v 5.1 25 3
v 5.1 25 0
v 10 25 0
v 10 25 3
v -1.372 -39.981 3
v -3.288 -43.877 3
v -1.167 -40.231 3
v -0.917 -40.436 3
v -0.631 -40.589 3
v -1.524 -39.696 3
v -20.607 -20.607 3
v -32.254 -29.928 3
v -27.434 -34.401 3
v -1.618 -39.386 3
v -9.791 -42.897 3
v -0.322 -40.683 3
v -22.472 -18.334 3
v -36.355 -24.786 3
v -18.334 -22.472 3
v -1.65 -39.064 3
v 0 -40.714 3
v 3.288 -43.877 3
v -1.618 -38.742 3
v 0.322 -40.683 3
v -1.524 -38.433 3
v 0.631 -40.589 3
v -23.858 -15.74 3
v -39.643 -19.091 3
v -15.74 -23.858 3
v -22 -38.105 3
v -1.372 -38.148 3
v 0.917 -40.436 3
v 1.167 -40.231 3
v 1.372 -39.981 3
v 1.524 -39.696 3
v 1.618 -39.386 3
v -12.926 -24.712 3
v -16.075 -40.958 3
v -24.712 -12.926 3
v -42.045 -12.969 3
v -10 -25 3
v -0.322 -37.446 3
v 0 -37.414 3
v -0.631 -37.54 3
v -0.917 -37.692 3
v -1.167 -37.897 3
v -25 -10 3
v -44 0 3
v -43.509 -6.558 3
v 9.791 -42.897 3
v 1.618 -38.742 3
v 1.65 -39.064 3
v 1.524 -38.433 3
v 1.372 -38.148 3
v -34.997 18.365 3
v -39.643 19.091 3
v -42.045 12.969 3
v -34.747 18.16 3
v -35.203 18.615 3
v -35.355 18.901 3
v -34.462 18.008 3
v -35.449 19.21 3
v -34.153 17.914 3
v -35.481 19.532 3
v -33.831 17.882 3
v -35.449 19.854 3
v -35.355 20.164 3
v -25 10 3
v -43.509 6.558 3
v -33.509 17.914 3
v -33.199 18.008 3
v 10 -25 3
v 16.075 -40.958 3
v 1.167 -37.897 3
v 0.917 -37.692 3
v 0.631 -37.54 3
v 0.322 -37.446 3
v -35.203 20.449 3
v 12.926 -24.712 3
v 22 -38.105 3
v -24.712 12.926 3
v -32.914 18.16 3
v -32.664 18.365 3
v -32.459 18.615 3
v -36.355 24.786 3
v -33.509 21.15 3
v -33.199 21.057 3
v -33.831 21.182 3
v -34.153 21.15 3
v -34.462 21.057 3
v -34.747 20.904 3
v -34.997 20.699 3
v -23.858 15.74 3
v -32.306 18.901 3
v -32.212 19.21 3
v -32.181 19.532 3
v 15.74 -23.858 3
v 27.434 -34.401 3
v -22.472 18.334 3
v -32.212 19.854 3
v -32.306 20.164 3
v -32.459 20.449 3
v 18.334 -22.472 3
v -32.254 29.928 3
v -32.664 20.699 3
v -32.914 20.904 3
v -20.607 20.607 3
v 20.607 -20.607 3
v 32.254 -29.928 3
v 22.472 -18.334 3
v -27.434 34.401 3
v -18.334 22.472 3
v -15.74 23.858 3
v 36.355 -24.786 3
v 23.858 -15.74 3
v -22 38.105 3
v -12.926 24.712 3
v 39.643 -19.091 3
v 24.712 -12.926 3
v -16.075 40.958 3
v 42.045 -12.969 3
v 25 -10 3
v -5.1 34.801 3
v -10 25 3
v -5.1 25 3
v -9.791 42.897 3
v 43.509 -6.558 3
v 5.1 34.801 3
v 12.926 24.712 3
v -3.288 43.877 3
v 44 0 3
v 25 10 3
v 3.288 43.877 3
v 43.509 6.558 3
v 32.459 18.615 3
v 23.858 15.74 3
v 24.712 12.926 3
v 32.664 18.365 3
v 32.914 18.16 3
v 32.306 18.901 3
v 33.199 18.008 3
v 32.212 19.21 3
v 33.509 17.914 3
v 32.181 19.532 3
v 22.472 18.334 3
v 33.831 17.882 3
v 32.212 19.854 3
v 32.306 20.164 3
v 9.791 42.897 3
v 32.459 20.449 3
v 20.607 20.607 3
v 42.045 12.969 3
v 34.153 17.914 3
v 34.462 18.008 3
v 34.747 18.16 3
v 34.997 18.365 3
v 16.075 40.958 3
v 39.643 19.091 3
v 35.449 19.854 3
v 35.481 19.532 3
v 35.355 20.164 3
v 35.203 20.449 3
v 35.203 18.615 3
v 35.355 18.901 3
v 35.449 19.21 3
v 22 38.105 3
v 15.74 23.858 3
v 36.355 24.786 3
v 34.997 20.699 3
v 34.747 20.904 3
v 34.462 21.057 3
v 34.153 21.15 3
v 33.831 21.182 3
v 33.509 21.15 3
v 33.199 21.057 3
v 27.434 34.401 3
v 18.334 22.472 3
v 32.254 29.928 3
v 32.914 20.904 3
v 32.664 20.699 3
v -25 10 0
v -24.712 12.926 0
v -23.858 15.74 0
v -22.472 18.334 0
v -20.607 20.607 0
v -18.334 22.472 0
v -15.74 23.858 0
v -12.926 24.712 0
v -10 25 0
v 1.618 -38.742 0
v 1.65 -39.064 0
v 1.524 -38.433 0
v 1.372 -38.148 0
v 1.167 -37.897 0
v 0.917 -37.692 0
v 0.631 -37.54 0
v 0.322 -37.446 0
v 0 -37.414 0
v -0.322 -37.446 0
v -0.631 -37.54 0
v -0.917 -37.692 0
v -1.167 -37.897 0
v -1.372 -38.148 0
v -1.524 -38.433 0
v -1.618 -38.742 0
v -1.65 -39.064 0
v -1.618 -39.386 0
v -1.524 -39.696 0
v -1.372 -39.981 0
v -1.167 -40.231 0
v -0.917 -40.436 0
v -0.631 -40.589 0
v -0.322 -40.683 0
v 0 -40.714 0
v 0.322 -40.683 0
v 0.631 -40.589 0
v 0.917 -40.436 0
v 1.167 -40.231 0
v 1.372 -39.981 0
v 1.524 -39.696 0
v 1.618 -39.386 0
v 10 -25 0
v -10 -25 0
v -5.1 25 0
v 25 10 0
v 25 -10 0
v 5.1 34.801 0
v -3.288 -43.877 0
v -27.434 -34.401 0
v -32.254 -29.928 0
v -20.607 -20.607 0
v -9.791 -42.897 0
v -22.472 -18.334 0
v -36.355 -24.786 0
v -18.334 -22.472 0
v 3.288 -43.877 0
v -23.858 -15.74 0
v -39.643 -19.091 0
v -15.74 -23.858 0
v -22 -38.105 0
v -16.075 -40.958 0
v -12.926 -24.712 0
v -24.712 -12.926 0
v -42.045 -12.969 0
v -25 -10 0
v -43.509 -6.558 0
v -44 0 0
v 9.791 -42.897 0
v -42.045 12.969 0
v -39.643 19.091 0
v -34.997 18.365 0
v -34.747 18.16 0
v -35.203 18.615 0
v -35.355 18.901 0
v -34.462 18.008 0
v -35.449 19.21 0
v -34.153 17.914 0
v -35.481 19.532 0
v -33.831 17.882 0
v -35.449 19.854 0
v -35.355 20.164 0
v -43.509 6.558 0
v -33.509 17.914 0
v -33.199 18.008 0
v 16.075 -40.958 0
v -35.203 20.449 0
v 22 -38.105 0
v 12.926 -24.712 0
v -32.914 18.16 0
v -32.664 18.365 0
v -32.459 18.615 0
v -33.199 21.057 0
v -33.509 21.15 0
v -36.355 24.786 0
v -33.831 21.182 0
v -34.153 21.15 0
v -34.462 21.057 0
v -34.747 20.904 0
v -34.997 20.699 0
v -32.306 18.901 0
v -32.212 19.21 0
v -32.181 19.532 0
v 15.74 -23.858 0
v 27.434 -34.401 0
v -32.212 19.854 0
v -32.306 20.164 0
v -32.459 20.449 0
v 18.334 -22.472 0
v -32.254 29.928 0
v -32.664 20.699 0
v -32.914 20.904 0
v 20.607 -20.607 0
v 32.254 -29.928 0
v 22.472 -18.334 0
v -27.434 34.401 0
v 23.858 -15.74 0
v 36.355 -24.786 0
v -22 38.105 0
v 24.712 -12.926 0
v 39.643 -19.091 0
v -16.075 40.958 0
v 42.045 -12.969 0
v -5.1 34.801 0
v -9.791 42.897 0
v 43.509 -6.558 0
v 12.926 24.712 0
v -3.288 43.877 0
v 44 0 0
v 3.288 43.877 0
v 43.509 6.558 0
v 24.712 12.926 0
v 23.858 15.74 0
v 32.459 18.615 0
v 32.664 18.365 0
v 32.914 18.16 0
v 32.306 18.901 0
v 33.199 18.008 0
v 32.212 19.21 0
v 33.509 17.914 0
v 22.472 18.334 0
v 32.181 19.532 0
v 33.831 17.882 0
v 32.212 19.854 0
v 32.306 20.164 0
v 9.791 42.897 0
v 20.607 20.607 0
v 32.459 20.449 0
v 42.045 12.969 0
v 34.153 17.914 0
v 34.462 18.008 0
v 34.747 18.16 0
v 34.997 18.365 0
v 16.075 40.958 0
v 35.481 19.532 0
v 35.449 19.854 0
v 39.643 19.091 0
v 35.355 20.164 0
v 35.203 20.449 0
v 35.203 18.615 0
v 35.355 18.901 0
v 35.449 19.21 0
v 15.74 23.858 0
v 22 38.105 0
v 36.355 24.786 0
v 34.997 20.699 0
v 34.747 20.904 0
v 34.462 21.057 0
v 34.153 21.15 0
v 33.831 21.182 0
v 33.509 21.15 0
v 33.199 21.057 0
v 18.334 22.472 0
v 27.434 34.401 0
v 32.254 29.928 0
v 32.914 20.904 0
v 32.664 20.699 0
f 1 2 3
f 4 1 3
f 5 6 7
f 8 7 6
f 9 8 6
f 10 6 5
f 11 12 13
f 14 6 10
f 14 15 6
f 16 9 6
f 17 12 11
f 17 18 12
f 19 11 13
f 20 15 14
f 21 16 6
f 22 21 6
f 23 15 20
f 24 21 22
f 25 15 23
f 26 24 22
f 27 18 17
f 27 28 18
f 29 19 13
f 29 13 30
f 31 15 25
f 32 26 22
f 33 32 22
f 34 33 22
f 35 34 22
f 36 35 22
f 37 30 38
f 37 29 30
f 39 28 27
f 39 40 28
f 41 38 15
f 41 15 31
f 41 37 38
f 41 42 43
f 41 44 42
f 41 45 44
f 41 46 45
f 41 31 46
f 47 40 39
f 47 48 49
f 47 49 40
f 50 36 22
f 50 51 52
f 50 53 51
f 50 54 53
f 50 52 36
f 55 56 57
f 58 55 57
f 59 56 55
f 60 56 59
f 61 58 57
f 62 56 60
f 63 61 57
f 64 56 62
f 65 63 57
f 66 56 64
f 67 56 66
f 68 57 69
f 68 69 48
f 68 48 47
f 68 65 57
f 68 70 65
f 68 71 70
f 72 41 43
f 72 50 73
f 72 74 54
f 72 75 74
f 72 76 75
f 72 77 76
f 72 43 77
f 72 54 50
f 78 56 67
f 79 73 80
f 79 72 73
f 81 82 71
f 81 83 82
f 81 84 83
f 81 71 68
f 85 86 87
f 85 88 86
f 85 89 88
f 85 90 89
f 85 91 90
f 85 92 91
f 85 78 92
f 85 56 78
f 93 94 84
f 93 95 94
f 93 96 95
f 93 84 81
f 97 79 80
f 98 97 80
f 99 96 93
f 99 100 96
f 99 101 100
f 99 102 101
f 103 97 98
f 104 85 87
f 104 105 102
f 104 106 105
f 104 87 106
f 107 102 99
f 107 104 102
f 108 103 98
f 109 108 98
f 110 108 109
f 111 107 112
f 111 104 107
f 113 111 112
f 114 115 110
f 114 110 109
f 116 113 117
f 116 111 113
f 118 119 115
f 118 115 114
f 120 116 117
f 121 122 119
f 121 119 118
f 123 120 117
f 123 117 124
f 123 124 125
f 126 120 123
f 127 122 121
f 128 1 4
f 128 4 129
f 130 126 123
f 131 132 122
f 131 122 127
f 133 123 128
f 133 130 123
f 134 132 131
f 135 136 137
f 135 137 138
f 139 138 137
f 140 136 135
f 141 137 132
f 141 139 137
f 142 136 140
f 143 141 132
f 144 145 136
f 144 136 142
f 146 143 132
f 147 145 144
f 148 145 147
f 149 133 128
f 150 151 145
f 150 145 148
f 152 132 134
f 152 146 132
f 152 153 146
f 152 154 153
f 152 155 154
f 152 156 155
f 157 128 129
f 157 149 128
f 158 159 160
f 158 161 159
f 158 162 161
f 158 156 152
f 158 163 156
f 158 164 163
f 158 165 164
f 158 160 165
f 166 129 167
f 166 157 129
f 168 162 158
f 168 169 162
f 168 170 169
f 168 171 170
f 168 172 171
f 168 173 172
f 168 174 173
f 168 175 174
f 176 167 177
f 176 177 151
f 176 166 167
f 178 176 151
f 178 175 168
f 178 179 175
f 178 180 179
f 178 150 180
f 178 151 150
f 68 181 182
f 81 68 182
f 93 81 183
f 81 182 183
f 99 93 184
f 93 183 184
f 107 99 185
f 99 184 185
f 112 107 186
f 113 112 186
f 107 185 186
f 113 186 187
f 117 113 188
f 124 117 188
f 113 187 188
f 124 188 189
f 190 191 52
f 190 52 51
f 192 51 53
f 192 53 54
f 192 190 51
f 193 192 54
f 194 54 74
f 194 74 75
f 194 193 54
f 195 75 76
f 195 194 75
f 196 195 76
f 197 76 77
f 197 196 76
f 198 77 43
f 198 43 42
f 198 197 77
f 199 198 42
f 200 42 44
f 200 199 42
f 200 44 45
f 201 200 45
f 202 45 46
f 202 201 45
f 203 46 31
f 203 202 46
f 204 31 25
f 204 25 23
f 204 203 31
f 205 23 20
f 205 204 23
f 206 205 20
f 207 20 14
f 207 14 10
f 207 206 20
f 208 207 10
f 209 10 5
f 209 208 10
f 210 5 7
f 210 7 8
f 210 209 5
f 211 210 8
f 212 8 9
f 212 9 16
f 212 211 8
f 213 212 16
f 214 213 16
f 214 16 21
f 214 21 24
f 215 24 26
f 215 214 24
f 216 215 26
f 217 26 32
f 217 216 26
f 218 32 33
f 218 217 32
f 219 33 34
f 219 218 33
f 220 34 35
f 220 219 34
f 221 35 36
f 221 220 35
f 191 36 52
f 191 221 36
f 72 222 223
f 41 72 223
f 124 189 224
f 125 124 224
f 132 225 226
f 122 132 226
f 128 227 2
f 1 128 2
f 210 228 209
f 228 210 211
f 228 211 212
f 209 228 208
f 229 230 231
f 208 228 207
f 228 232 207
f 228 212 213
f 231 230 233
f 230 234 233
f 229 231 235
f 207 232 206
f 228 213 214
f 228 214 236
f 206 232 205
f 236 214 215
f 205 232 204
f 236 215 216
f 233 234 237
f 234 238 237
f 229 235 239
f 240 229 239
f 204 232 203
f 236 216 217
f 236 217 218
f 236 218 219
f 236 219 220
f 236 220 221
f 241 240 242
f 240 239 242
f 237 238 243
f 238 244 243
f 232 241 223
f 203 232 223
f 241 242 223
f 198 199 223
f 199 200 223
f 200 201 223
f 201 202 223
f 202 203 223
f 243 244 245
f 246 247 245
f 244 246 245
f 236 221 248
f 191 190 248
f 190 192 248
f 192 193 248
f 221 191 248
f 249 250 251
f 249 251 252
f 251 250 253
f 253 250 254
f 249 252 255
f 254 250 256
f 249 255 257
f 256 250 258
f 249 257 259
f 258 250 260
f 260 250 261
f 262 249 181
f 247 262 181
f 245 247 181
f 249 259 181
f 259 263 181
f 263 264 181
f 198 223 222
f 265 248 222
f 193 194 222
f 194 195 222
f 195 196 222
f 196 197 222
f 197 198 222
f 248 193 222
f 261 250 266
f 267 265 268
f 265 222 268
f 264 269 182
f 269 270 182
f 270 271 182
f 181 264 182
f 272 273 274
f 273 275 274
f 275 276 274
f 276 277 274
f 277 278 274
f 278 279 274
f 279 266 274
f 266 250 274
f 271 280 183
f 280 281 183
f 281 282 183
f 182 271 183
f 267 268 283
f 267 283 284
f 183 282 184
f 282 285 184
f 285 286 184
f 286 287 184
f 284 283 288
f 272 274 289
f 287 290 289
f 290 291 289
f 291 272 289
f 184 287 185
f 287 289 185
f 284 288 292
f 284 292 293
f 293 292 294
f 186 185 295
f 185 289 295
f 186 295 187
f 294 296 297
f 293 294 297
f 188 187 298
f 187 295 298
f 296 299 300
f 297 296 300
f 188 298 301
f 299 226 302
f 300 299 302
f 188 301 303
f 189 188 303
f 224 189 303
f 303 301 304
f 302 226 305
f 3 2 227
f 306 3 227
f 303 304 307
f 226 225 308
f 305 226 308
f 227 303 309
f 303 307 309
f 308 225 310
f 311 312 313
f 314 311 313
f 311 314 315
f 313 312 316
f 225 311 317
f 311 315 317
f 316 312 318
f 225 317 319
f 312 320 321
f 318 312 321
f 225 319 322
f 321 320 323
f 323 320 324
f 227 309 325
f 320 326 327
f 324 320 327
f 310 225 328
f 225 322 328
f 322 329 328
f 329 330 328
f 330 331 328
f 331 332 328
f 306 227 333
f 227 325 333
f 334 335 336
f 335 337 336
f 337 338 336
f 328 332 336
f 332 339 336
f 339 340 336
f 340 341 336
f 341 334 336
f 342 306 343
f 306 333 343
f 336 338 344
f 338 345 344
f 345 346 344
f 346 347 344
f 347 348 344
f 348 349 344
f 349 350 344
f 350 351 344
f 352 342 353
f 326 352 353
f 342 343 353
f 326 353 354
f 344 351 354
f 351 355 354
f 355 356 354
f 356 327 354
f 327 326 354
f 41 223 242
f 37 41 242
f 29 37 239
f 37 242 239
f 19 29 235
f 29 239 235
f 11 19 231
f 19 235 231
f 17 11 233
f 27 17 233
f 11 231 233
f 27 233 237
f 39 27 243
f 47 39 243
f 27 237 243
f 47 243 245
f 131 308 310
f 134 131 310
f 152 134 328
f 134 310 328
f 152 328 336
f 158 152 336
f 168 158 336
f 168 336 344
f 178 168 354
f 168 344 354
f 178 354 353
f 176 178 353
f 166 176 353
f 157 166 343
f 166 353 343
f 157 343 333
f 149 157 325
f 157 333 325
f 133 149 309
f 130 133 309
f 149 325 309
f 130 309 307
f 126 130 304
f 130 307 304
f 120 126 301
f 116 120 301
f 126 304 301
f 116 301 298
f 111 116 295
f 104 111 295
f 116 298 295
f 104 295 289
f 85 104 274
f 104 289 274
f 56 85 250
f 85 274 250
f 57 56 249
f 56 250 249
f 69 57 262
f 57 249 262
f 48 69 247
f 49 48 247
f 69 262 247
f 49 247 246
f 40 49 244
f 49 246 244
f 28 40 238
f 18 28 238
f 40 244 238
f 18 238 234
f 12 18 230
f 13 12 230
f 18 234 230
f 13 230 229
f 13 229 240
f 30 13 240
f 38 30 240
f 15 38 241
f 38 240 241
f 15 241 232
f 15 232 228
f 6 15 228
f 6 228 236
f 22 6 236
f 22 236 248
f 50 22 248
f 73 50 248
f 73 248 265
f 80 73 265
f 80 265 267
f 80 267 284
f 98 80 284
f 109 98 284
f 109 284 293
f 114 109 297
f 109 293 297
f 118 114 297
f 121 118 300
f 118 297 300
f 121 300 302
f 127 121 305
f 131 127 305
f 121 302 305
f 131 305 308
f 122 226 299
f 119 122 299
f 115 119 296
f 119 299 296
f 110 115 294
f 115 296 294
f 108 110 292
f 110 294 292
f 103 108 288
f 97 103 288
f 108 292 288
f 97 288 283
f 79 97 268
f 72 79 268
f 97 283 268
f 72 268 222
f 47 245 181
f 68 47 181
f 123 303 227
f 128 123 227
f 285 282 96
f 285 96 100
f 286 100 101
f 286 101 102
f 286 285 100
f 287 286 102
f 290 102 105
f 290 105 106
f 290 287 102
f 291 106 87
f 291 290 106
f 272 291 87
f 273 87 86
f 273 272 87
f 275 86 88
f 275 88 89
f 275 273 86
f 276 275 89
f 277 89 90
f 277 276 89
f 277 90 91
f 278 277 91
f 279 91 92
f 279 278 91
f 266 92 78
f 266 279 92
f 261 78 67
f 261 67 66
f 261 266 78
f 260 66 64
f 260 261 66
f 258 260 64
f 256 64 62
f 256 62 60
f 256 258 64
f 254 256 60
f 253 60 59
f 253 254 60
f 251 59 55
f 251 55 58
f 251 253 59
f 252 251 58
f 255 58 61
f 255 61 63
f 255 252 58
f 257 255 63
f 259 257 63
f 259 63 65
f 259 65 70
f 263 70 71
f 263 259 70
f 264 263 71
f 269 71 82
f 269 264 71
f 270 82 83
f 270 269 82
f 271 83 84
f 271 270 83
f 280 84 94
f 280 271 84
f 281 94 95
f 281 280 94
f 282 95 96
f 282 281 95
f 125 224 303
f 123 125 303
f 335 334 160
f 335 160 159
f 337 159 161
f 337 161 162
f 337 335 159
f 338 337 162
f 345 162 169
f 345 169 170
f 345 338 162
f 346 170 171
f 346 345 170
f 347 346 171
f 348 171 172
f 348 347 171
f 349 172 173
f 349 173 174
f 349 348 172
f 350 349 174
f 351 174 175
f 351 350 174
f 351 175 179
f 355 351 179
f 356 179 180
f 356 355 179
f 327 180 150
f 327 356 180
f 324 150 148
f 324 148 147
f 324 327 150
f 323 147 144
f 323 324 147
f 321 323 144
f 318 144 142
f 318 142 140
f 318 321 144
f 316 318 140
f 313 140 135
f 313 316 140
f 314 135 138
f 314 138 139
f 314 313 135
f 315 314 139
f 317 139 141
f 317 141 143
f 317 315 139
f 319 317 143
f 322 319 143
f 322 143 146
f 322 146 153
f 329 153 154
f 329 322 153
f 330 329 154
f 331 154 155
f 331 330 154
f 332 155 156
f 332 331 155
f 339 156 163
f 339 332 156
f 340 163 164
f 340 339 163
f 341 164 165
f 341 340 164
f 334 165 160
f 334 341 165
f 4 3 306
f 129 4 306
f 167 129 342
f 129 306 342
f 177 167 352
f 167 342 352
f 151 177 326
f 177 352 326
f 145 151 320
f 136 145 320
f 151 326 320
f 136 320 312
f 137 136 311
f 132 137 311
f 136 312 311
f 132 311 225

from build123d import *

# Parameters (mm, degrees)
F0_R     = 44
F0_R_2   = 1.65
F1_DEPTH = 3


with BuildPart() as f1:
    # F0 (on Top) → F1 (new body)
    with BuildSketch(Plane.XY):
        Circle(F0_R)
        with Locations((0, -39.064214)):
            Circle(F0_R_2, mode=Mode.SUBTRACT)
        with Locations((-33.830601, 19.532107)):
            Circle(F0_R_2, mode=Mode.SUBTRACT)
        with BuildLine():
            Line((5.1, 34.800884), (5.1, 25))
            Line((5.1, 25), (10, 25))
            ThreePointArc((10, 25), (20.606602, 20.606602), (25, 10))
            Line((25, 10), (25, -10))
            ThreePointArc((25, -10), (20.606602, -20.606602), (10, -25))
            Line((10, -25), (-10, -25))
            ThreePointArc((-10, -25), (-20.606602, -20.606602), (-25, -10))
            Line((-25, -10), (-25, 10))
            ThreePointArc((-25, 10), (-20.606602, 20.606602), (-10, 25))
            Line((-10, 25), (-5.1, 25))
            Line((-5.1, 25), (-5.1, 34.800884))
            Line((-5.1, 34.800884), (5.1, 34.800884))
        make_face(mode=Mode.SUBTRACT)
        with Locations((33.830601, 19.532107)):
            Circle(F0_R_2, mode=Mode.SUBTRACT)
    extrude(amount=F1_DEPTH)


solid = f1.part
